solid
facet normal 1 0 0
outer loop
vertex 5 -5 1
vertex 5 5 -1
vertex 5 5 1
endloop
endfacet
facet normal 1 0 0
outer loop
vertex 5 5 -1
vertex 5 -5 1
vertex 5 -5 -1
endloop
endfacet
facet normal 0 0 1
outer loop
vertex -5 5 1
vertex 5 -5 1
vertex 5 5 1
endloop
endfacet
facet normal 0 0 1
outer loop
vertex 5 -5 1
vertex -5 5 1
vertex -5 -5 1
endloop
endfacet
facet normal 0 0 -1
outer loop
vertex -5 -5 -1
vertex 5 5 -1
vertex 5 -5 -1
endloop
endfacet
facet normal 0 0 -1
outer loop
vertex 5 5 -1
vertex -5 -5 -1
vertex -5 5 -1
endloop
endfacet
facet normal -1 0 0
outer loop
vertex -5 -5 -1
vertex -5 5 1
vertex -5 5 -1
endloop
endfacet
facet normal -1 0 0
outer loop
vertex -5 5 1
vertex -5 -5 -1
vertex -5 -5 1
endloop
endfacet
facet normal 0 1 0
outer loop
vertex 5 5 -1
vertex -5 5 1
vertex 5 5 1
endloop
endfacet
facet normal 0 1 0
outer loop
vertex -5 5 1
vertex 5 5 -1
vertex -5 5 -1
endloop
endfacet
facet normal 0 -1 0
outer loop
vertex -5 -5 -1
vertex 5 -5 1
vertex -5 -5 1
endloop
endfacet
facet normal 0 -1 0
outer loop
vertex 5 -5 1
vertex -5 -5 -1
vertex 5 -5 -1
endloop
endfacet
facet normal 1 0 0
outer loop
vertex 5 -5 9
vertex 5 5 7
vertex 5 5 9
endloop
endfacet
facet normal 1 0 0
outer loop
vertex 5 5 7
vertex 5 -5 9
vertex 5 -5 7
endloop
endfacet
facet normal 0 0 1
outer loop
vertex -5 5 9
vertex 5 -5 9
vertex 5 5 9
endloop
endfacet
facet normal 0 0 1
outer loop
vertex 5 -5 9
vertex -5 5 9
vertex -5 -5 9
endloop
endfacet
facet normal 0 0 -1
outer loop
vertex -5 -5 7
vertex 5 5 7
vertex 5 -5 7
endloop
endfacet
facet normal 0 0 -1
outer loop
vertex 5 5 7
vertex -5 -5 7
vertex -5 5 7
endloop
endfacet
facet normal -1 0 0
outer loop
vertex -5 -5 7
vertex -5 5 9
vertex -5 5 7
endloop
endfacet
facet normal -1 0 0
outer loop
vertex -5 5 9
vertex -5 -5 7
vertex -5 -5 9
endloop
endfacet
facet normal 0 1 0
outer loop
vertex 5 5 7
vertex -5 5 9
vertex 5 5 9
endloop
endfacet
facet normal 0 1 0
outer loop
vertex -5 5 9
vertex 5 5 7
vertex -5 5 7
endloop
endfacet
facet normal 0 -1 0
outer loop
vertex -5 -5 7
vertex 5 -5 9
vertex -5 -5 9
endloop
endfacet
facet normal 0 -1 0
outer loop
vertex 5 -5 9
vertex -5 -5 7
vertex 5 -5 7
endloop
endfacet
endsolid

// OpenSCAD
// Stream F digital exploded placeholder for edge_io_rings
// Not a tooling model. Not an ergonomic pass.
// ring pair concept envelope
module exploded_placeholder() {
  translate([0,0,0]) cube([10,10,2], center=true);
  translate([0,0,8]) cube([10,10,2], center=true);
}
exploded_placeholder();
